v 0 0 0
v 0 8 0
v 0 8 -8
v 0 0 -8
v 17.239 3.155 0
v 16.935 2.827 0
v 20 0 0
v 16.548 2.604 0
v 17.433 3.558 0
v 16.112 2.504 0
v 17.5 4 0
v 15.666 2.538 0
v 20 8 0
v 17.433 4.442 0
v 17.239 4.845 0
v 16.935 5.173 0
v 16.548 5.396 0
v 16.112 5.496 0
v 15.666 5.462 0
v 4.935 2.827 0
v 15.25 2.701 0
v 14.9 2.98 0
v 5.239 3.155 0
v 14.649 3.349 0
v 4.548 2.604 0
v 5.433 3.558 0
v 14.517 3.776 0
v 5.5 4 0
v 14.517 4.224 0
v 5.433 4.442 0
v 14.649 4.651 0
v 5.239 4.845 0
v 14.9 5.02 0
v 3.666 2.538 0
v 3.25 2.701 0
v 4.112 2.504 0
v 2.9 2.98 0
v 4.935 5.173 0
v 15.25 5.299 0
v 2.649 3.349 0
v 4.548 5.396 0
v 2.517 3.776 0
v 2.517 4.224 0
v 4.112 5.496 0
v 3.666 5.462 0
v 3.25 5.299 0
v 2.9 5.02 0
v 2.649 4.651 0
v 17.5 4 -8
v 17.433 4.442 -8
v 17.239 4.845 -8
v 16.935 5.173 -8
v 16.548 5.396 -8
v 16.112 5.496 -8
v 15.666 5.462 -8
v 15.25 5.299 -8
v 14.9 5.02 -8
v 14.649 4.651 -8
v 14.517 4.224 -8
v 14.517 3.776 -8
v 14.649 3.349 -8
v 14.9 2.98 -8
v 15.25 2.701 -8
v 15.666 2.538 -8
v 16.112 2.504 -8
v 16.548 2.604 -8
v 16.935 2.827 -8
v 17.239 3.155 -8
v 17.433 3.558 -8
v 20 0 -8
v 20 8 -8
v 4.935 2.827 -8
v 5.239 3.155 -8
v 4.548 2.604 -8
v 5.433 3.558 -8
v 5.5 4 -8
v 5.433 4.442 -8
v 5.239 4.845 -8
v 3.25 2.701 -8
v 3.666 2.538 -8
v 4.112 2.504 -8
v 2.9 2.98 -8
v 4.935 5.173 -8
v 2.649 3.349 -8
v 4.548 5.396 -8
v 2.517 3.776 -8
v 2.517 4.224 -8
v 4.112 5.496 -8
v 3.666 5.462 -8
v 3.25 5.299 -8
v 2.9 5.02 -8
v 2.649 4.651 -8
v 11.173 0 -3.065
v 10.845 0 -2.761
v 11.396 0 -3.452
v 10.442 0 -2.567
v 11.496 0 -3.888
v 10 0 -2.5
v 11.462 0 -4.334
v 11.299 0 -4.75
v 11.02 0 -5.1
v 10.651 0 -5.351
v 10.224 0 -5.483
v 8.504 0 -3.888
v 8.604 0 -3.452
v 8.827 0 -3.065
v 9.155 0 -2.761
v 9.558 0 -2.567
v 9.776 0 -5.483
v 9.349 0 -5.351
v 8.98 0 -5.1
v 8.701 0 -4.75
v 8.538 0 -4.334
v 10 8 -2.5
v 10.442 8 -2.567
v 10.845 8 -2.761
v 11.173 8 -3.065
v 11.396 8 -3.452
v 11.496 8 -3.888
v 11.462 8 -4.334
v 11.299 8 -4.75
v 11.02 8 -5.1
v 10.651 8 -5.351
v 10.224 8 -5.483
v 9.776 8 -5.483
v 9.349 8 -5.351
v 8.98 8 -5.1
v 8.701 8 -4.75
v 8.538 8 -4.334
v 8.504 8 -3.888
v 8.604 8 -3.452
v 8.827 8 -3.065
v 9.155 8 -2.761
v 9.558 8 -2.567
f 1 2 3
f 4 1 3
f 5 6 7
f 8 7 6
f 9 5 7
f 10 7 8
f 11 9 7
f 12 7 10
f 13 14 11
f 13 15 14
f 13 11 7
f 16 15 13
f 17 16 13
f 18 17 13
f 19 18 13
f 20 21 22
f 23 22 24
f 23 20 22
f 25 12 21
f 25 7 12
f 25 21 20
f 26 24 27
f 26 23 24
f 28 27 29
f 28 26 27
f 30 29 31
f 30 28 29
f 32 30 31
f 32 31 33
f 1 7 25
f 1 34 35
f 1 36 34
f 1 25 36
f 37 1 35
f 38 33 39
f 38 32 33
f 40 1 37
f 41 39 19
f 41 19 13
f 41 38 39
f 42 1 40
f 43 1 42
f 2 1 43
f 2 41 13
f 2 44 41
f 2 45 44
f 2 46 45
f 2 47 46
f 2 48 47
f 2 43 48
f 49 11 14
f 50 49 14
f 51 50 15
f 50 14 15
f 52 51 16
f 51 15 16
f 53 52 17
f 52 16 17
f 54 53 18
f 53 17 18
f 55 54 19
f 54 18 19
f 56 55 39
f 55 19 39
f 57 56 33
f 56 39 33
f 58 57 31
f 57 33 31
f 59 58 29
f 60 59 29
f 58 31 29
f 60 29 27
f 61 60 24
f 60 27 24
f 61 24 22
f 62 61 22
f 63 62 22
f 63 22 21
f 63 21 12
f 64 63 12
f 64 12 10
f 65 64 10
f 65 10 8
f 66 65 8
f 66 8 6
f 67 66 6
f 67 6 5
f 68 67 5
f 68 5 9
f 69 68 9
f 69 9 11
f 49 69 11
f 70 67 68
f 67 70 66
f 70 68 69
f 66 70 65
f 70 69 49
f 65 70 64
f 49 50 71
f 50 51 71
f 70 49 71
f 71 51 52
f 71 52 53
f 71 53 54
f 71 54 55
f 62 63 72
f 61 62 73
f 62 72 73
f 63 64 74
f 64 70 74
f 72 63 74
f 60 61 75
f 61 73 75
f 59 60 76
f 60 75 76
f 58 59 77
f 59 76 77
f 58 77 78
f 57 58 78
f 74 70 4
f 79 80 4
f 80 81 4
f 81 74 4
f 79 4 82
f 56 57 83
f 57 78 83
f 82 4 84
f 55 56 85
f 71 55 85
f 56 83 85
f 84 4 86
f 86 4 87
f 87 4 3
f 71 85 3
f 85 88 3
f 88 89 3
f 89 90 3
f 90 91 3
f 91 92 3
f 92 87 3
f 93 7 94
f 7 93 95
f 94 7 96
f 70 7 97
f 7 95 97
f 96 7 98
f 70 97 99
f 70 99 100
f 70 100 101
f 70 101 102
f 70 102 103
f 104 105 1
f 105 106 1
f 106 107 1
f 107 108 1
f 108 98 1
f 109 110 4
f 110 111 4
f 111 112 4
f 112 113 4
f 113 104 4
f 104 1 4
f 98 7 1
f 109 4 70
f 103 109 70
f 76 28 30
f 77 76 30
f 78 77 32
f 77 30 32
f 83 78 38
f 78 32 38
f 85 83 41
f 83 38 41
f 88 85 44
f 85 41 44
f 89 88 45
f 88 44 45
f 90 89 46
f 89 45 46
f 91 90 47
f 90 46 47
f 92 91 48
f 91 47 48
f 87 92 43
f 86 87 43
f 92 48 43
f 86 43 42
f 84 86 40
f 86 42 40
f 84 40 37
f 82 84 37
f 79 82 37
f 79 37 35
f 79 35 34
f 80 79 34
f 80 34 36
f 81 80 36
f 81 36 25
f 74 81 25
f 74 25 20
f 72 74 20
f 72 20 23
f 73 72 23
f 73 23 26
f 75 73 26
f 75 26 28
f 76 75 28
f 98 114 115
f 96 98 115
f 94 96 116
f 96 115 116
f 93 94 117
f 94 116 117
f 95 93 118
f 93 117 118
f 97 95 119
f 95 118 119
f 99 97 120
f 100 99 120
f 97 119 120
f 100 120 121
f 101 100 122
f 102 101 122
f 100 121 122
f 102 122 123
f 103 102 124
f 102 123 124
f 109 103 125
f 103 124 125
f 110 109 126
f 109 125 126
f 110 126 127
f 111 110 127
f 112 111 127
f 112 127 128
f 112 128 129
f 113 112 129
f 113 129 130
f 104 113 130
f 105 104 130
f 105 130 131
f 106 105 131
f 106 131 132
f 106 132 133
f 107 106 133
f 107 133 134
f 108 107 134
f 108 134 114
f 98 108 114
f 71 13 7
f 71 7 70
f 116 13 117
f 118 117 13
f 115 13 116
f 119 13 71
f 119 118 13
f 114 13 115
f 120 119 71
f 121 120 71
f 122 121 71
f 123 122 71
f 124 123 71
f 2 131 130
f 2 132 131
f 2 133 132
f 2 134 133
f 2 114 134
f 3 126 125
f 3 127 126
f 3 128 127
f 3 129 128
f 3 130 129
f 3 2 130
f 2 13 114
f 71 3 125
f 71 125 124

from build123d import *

# Parameters (mm, degrees)
SKETCH_1_W          = 8
SKETCH_1_H          = 8
EXTRUDE_1_DEPTH     = 20
SKETCH_3_R          = 1.5
CUT_EXTRUDE_1_DEPTH = 23.978250586
SKETCH_5_R          = 1.5
CUT_EXTRUDE_2_DEPTH = 23.978250586


with BuildPart() as part:
    # 草图1 → 凸台-拉伸1 (new body)
    with BuildSketch(Plane(origin=(0, 0, 0), x_dir=(0, 0, -1), z_dir=(1, 0, 0))):
        with Locations((4, 4)):
            Rectangle(SKETCH_1_W, SKETCH_1_H)
    extrude(amount=EXTRUDE_1_DEPTH)

    # 草图3 → 切除-拉伸1 (cut, through all)
    with BuildSketch(Plane.XY):
        with Locations((4, 4)):
            Circle(SKETCH_3_R)
        with Locations((16, 4)):
            Circle(SKETCH_3_R)
    extrude(amount=-CUT_EXTRUDE_1_DEPTH, mode=Mode.SUBTRACT)

    # 草图5 → 切除-拉伸2 (cut, through all)
    with BuildSketch(Plane(origin=(0, 8, 0), x_dir=(1, 0, 0), z_dir=(0, 1, 0))):
        with Locations(Location((10, 4, 0), (0, 0, 270))):
            Circle(SKETCH_5_R)
    extrude(amount=-CUT_EXTRUDE_2_DEPTH, mode=Mode.SUBTRACT)


solid = part.part
